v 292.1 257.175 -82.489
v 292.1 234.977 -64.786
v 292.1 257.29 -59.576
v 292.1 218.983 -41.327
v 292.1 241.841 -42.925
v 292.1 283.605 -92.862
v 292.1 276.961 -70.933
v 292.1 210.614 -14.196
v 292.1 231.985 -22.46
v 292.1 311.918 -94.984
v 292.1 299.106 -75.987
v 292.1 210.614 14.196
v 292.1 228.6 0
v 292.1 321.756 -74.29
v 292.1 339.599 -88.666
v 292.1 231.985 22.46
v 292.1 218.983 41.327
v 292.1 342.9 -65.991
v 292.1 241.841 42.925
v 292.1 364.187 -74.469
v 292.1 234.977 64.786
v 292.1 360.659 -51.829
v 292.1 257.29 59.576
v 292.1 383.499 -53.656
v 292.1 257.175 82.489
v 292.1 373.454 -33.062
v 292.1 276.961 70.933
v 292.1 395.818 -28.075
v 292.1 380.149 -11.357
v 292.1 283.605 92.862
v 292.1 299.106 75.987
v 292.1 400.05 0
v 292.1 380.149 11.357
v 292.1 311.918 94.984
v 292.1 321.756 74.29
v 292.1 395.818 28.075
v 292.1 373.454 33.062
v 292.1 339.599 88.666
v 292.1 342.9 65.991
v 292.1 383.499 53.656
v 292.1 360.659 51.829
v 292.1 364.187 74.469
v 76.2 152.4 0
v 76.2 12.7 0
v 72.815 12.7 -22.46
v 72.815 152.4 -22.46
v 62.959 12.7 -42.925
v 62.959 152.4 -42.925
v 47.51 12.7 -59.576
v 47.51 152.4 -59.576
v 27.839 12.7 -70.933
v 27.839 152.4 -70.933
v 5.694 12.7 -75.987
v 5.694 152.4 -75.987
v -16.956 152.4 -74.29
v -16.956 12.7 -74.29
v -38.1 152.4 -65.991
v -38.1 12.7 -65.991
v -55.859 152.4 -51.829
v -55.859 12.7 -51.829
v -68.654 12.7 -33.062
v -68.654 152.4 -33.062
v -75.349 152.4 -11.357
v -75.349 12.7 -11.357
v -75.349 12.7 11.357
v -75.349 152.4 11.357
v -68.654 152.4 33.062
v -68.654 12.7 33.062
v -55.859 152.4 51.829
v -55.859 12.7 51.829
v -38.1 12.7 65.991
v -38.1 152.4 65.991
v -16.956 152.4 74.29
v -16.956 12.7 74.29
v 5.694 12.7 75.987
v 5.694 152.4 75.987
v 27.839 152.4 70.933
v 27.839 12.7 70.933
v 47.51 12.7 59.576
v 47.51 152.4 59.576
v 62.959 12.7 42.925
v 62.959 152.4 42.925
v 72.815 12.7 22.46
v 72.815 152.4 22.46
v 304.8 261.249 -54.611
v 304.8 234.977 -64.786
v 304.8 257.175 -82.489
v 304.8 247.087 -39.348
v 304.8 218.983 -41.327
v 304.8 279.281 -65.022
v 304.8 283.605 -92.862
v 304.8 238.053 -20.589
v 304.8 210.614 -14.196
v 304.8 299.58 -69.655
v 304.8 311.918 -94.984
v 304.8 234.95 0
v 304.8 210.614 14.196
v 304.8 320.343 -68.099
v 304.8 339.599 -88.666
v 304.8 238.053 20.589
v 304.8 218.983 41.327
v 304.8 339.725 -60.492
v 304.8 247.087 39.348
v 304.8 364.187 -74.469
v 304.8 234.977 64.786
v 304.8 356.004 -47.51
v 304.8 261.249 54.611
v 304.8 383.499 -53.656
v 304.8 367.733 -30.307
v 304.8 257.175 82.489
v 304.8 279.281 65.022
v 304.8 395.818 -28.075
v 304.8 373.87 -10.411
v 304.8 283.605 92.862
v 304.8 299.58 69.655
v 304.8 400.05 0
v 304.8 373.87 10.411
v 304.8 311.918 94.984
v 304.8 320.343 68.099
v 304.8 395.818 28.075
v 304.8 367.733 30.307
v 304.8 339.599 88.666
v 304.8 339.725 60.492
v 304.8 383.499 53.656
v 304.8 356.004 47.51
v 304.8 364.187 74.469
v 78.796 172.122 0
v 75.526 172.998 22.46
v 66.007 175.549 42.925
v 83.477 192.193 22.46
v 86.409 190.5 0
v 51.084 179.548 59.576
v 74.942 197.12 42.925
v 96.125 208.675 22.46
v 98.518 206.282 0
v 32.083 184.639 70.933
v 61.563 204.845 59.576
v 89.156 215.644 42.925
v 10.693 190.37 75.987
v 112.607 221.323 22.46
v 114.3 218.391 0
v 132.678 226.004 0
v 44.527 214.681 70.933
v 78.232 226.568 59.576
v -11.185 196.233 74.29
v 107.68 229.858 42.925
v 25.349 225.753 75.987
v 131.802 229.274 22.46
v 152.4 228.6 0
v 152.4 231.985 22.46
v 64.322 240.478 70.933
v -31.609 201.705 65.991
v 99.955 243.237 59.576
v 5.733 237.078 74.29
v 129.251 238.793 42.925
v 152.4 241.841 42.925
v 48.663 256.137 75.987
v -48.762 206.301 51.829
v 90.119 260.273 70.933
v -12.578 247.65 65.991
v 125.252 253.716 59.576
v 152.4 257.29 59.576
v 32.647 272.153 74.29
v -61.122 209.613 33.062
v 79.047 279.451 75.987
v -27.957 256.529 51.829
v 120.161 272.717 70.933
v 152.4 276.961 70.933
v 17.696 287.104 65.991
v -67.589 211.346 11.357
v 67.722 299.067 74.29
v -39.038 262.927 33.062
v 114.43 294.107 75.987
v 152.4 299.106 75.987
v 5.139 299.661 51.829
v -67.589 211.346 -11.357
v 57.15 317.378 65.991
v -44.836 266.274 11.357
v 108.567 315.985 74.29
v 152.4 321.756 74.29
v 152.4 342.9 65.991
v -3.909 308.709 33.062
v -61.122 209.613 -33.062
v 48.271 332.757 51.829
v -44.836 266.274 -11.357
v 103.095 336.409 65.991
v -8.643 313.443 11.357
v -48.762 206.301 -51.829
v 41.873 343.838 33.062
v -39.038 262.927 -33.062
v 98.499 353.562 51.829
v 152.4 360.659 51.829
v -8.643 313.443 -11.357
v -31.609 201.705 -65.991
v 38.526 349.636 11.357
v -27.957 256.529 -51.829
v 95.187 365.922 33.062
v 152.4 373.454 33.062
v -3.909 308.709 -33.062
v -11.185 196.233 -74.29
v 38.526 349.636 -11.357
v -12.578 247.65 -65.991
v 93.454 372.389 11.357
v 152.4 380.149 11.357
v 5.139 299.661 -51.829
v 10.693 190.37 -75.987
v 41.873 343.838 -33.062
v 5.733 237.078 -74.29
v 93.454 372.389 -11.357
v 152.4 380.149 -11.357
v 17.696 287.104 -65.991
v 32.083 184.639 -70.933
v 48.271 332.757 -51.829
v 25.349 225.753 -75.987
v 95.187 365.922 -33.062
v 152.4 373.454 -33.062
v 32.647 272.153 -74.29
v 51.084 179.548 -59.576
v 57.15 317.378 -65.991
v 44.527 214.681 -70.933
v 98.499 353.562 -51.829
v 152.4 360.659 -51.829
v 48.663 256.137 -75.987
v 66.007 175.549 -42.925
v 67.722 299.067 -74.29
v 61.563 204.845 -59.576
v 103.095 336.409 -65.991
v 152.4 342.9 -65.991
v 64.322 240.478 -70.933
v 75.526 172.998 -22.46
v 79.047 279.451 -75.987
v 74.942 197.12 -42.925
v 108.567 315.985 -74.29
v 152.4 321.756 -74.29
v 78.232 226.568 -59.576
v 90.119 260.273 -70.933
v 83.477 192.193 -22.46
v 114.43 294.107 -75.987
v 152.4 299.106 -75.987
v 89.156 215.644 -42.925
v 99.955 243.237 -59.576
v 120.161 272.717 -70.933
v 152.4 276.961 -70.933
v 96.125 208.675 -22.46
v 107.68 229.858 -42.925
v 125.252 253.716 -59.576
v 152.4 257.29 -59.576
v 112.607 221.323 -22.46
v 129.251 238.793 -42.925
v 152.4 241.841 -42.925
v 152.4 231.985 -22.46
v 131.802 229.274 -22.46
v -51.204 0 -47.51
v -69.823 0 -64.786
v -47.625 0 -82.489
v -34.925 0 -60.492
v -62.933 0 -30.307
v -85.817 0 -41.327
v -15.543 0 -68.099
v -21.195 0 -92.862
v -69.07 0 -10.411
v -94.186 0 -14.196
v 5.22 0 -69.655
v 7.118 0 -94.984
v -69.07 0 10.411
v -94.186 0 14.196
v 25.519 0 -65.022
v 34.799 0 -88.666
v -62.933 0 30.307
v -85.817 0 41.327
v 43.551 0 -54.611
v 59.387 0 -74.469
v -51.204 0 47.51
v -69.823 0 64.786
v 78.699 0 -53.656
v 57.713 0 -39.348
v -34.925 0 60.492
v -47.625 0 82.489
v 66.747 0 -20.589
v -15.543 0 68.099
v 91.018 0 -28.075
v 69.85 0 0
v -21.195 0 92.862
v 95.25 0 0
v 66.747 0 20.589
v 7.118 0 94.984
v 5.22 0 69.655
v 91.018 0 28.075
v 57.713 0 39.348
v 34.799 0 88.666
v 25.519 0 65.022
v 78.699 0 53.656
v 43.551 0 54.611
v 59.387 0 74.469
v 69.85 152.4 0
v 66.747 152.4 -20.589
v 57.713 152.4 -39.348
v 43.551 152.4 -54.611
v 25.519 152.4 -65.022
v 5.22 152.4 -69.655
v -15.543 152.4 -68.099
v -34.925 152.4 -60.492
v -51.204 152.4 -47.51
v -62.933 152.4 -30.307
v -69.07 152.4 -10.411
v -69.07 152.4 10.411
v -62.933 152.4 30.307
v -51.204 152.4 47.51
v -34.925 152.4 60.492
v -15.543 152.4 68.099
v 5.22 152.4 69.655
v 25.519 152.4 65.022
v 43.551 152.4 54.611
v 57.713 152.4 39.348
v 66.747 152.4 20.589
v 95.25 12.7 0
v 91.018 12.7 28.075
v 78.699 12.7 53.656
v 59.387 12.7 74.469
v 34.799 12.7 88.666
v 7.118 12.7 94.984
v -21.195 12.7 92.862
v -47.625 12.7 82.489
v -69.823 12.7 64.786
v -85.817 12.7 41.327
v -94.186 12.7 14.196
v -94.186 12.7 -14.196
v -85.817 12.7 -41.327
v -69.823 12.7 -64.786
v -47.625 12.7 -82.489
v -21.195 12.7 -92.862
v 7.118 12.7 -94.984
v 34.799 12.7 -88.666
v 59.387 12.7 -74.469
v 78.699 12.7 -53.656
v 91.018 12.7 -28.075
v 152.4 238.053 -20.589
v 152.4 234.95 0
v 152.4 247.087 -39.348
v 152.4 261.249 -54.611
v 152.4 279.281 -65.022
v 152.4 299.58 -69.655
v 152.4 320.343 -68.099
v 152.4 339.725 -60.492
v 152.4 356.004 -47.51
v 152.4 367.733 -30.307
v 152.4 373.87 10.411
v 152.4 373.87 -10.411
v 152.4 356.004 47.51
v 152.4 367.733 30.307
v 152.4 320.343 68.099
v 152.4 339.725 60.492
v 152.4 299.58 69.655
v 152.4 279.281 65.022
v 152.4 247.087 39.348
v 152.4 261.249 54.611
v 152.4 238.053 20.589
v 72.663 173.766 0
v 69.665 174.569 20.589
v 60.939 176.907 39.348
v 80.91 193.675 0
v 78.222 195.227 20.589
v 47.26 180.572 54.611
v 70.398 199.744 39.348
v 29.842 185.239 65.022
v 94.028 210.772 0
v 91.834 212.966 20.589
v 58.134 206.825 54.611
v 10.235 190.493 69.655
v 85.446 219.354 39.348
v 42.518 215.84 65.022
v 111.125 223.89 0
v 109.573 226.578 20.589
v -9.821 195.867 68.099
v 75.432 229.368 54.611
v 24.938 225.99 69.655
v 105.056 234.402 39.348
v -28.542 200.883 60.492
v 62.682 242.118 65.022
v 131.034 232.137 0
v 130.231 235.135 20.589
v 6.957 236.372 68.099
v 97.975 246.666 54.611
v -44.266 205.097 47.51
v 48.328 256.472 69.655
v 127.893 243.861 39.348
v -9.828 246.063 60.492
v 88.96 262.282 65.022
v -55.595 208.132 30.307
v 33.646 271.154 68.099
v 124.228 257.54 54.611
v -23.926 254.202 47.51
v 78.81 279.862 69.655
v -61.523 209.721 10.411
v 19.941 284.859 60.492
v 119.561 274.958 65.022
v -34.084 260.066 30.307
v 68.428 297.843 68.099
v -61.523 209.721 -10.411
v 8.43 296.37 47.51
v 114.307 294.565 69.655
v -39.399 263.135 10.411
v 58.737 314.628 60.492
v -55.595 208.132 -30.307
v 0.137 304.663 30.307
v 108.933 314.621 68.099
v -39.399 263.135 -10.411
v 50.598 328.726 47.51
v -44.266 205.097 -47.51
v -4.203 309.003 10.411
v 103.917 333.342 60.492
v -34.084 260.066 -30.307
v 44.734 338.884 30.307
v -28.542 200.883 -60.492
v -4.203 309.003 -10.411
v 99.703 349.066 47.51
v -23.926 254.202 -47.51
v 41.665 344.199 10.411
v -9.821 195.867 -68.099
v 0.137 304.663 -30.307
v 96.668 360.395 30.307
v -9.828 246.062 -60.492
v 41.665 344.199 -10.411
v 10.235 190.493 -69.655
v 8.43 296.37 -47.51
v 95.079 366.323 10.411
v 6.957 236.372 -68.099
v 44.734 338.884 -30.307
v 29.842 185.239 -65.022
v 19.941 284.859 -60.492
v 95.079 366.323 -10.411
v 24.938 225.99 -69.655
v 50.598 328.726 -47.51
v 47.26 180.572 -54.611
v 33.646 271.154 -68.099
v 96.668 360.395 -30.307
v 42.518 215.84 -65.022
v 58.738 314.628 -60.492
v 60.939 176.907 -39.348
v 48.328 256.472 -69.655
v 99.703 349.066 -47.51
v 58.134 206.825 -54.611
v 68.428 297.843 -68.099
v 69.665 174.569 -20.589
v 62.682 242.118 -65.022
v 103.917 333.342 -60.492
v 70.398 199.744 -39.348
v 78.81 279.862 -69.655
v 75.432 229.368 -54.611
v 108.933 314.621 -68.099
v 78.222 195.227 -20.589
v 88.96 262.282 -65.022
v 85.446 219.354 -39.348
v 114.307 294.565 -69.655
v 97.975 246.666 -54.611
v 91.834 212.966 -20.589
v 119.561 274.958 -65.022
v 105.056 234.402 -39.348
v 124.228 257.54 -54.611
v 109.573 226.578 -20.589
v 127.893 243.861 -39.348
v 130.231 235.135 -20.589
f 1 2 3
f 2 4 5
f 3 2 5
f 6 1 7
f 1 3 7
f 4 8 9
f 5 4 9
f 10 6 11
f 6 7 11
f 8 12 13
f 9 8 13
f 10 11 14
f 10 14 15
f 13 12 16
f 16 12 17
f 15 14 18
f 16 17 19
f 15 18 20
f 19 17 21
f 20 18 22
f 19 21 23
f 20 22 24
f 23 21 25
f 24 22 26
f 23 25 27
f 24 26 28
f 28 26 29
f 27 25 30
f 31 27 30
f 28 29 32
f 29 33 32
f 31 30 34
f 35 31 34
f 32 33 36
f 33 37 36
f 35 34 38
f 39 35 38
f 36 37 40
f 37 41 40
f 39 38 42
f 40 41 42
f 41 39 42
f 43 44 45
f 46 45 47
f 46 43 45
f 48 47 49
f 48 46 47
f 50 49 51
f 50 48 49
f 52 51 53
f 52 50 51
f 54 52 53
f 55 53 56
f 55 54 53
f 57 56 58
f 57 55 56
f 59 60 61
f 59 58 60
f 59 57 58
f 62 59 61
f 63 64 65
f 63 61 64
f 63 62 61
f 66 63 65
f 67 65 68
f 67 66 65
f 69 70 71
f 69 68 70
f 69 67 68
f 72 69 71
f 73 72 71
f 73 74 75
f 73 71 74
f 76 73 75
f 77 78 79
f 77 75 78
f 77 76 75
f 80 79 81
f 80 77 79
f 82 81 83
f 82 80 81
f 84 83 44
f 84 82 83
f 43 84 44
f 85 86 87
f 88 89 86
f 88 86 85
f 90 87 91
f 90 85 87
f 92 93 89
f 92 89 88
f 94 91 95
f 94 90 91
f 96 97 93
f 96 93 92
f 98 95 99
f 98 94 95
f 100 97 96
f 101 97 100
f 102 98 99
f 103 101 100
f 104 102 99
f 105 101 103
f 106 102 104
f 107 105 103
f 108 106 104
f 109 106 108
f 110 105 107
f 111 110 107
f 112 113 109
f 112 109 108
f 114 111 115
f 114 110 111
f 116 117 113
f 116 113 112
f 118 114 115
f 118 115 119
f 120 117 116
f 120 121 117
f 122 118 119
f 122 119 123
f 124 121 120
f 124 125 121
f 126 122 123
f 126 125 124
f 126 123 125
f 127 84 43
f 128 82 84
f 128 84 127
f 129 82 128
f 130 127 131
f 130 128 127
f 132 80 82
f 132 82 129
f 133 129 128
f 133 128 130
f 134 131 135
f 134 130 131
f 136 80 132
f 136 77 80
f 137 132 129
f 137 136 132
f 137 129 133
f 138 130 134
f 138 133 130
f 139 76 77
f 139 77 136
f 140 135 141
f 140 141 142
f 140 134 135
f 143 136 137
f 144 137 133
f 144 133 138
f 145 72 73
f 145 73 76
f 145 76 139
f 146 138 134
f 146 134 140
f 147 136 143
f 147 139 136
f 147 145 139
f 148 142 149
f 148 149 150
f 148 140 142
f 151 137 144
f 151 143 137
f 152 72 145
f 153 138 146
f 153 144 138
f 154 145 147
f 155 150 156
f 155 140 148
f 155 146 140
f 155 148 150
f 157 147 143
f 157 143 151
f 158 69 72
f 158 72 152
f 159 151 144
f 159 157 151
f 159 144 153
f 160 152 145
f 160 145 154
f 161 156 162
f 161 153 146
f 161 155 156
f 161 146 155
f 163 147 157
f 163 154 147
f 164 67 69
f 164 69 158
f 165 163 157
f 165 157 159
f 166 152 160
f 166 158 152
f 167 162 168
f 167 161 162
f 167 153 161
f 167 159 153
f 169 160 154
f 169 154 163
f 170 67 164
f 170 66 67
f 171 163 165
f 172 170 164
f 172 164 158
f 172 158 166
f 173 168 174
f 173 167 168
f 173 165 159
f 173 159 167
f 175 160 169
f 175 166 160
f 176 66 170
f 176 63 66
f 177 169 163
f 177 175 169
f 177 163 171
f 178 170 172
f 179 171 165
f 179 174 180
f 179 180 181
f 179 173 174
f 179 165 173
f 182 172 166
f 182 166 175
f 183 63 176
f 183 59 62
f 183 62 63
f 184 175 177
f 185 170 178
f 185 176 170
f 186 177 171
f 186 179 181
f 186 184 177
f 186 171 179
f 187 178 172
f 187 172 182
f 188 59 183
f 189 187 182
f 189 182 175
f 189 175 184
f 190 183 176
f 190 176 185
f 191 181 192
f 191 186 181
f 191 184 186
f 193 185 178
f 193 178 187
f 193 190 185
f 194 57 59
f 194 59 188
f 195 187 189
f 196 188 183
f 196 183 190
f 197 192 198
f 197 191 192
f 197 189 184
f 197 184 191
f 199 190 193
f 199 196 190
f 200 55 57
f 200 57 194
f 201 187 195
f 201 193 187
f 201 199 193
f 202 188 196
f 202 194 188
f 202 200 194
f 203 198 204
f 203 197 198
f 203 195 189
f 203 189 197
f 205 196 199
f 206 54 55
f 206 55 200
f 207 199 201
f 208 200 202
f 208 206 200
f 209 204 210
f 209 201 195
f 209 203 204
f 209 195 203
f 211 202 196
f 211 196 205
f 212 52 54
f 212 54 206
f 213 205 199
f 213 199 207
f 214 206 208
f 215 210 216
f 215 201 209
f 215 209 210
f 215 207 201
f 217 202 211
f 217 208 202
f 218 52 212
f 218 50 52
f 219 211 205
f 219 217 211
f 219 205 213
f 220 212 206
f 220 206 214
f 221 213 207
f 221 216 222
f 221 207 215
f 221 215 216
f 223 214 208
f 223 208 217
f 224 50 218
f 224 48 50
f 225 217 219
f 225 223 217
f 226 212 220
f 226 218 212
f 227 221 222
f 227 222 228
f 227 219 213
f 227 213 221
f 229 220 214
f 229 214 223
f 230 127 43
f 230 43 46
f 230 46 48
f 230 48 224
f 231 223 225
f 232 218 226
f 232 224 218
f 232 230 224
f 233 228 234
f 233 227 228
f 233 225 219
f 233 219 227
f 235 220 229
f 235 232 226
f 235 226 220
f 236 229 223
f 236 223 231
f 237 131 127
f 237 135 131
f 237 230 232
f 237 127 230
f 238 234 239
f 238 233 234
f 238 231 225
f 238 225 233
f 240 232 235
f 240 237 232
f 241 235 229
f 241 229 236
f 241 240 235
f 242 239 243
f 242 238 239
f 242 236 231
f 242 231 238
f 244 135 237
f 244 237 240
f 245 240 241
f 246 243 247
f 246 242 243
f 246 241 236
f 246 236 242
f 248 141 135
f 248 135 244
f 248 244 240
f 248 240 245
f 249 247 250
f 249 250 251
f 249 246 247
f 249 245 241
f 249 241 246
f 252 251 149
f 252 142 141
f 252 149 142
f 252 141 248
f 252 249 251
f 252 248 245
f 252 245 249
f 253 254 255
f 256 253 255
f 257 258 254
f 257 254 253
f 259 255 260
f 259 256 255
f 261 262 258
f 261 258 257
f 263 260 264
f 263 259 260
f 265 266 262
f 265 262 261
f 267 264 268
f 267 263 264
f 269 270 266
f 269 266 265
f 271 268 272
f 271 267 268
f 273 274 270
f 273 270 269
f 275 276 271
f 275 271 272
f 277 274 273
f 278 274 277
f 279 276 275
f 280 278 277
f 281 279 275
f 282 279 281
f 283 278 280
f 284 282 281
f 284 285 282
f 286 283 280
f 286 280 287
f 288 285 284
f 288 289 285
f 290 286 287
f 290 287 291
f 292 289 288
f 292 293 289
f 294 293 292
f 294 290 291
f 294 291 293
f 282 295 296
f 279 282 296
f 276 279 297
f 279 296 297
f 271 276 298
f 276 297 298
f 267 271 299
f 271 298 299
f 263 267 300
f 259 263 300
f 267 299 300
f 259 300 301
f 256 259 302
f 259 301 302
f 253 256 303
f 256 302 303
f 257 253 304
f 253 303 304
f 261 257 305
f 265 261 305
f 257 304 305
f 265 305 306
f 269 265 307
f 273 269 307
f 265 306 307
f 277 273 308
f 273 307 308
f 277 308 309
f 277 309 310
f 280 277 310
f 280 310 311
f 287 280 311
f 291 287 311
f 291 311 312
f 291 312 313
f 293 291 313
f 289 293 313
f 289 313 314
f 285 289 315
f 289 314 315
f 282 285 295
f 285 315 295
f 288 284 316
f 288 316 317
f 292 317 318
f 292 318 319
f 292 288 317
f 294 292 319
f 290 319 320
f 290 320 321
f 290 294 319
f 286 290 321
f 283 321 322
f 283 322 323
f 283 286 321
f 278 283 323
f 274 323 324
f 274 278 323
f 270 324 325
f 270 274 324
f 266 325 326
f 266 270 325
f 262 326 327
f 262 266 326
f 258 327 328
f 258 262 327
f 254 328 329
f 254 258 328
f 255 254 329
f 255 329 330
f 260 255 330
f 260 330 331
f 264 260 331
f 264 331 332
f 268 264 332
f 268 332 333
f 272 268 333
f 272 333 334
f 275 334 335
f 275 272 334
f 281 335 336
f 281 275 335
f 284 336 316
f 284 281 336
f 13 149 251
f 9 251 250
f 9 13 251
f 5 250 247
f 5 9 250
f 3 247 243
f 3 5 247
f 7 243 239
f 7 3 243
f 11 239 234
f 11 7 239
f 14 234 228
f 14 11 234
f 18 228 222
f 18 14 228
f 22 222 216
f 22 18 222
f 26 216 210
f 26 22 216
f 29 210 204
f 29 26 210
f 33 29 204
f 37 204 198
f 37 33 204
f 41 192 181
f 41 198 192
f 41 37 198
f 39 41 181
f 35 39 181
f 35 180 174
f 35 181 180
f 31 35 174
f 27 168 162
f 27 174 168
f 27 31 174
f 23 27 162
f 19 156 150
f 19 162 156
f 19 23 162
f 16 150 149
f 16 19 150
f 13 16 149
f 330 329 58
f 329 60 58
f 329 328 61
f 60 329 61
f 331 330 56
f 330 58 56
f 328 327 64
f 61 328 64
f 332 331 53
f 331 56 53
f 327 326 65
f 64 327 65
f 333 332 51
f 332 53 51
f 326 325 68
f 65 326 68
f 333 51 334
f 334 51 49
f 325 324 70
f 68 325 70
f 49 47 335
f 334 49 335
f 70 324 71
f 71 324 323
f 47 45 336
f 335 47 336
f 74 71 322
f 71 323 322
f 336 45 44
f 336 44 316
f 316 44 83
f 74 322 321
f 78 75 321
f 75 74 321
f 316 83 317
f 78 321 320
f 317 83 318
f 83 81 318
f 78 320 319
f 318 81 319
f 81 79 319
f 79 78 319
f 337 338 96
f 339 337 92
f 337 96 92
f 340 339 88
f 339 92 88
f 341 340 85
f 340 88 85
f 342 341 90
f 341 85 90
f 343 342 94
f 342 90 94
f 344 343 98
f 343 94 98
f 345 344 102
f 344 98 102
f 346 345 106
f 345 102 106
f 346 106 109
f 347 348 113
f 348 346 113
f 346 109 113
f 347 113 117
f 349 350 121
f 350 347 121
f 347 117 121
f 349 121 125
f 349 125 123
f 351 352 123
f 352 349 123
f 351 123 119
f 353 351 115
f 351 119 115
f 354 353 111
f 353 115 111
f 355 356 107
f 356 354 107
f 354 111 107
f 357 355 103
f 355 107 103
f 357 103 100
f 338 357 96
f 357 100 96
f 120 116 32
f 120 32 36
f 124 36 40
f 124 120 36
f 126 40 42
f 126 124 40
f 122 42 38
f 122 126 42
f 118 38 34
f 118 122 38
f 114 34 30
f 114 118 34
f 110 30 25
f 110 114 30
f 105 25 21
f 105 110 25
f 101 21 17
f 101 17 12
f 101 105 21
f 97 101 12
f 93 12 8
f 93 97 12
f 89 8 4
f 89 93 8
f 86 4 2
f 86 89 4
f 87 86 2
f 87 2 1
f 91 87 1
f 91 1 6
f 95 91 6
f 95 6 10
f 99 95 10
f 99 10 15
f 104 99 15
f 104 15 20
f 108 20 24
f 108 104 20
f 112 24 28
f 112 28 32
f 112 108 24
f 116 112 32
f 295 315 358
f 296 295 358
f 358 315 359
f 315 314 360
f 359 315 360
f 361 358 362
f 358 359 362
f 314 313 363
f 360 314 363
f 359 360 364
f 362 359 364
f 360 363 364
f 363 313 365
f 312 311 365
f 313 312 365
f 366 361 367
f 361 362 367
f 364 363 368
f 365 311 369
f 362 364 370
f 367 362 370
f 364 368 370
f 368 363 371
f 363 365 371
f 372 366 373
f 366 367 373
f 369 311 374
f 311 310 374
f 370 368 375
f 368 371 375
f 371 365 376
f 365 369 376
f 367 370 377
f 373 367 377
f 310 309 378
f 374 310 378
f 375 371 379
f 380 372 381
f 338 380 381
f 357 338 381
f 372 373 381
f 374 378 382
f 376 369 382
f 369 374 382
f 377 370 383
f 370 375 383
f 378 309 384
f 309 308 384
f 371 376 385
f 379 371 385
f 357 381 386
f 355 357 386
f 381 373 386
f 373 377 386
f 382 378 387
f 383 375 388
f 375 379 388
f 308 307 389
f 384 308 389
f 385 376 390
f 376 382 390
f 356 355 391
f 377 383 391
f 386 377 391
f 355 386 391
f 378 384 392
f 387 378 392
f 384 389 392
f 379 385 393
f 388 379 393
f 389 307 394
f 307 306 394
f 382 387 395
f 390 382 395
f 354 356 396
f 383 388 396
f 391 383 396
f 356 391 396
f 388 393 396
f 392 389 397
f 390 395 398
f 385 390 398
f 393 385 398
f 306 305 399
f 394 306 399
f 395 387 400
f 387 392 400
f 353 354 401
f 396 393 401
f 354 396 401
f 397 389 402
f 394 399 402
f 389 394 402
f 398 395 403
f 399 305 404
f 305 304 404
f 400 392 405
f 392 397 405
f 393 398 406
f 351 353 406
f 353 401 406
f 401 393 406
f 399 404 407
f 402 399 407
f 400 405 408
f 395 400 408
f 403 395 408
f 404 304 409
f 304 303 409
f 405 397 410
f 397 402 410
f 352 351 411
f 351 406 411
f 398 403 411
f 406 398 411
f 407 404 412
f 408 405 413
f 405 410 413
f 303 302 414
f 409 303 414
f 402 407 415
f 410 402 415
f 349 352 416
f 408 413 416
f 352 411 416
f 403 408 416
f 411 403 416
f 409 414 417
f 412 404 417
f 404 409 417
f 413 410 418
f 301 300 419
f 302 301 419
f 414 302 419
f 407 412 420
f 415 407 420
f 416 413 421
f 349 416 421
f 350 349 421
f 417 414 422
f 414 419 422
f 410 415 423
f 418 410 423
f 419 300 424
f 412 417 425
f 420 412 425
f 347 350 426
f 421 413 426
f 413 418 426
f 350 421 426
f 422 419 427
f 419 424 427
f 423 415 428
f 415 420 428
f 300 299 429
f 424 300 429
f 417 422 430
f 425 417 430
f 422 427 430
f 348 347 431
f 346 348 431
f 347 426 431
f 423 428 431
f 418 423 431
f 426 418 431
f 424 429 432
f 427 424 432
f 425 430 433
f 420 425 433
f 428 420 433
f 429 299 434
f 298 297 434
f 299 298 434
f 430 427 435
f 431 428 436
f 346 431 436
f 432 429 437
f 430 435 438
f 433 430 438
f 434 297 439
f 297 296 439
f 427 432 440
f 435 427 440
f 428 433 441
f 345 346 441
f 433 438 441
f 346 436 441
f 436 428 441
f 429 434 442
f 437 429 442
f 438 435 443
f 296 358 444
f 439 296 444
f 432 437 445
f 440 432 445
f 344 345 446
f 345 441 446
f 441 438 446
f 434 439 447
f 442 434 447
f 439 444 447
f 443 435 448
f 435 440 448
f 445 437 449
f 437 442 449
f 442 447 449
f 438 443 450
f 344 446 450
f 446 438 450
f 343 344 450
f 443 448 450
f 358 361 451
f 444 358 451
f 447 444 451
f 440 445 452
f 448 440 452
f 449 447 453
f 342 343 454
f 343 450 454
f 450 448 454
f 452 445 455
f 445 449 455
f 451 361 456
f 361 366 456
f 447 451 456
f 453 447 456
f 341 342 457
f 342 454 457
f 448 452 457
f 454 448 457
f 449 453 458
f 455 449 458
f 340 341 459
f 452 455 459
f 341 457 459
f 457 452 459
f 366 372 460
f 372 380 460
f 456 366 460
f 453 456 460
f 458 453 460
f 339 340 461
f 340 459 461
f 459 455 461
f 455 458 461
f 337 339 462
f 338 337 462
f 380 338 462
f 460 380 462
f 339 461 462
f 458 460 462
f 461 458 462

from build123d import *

# Parameters (mm, degrees)
F0_R     = 76.2
F3_T     = -6.35
F0_R_2   = 95.25
F4_DEPTH = 12.7
F6_R     = 95.25
F6_R_2   = 76.2
F7_DEPTH = 12.7


with BuildPart() as f2:
    # F2: sweep along a path in F1
    with BuildLine(Plane.XY) as f2_path:
        Line((0, 0), (0, 152.4))
        ThreePointArc((0, 152.4), (44.6369265472, 260.1630734528), (152.4, 304.8))
        Line((152.4, 304.8), (304.8, 304.8))
    # F0 (on Front) → F2 (sweep)
    with BuildSketch(Plane.XZ):
        Circle(F0_R)
    sweep(path=f2_path.line)

    # F3
    f3_openings = [f2.faces().sort_by_distance(p)[0] for p in [
        (0, 0, 0),
        (304.8, 304.8, 0),
    ]]
    offset(amount=F3_T, openings=f3_openings)

    # F0 (on Front) → F4 (join)
    with BuildSketch(Plane.XZ):
        Circle(F0_R_2)
        Circle(F0_R, mode=Mode.SUBTRACT)
    extrude(amount=-F4_DEPTH)

    # F6 (on line) → F7 (join)
    with BuildSketch(Plane.YZ.offset(304.8)):
        with Locations((304.8, 0)):
            Circle(F6_R)
        with Locations((304.8, 0)):
            Circle(F6_R_2, mode=Mode.SUBTRACT)
    extrude(amount=-F7_DEPTH)


solid = f2.part
